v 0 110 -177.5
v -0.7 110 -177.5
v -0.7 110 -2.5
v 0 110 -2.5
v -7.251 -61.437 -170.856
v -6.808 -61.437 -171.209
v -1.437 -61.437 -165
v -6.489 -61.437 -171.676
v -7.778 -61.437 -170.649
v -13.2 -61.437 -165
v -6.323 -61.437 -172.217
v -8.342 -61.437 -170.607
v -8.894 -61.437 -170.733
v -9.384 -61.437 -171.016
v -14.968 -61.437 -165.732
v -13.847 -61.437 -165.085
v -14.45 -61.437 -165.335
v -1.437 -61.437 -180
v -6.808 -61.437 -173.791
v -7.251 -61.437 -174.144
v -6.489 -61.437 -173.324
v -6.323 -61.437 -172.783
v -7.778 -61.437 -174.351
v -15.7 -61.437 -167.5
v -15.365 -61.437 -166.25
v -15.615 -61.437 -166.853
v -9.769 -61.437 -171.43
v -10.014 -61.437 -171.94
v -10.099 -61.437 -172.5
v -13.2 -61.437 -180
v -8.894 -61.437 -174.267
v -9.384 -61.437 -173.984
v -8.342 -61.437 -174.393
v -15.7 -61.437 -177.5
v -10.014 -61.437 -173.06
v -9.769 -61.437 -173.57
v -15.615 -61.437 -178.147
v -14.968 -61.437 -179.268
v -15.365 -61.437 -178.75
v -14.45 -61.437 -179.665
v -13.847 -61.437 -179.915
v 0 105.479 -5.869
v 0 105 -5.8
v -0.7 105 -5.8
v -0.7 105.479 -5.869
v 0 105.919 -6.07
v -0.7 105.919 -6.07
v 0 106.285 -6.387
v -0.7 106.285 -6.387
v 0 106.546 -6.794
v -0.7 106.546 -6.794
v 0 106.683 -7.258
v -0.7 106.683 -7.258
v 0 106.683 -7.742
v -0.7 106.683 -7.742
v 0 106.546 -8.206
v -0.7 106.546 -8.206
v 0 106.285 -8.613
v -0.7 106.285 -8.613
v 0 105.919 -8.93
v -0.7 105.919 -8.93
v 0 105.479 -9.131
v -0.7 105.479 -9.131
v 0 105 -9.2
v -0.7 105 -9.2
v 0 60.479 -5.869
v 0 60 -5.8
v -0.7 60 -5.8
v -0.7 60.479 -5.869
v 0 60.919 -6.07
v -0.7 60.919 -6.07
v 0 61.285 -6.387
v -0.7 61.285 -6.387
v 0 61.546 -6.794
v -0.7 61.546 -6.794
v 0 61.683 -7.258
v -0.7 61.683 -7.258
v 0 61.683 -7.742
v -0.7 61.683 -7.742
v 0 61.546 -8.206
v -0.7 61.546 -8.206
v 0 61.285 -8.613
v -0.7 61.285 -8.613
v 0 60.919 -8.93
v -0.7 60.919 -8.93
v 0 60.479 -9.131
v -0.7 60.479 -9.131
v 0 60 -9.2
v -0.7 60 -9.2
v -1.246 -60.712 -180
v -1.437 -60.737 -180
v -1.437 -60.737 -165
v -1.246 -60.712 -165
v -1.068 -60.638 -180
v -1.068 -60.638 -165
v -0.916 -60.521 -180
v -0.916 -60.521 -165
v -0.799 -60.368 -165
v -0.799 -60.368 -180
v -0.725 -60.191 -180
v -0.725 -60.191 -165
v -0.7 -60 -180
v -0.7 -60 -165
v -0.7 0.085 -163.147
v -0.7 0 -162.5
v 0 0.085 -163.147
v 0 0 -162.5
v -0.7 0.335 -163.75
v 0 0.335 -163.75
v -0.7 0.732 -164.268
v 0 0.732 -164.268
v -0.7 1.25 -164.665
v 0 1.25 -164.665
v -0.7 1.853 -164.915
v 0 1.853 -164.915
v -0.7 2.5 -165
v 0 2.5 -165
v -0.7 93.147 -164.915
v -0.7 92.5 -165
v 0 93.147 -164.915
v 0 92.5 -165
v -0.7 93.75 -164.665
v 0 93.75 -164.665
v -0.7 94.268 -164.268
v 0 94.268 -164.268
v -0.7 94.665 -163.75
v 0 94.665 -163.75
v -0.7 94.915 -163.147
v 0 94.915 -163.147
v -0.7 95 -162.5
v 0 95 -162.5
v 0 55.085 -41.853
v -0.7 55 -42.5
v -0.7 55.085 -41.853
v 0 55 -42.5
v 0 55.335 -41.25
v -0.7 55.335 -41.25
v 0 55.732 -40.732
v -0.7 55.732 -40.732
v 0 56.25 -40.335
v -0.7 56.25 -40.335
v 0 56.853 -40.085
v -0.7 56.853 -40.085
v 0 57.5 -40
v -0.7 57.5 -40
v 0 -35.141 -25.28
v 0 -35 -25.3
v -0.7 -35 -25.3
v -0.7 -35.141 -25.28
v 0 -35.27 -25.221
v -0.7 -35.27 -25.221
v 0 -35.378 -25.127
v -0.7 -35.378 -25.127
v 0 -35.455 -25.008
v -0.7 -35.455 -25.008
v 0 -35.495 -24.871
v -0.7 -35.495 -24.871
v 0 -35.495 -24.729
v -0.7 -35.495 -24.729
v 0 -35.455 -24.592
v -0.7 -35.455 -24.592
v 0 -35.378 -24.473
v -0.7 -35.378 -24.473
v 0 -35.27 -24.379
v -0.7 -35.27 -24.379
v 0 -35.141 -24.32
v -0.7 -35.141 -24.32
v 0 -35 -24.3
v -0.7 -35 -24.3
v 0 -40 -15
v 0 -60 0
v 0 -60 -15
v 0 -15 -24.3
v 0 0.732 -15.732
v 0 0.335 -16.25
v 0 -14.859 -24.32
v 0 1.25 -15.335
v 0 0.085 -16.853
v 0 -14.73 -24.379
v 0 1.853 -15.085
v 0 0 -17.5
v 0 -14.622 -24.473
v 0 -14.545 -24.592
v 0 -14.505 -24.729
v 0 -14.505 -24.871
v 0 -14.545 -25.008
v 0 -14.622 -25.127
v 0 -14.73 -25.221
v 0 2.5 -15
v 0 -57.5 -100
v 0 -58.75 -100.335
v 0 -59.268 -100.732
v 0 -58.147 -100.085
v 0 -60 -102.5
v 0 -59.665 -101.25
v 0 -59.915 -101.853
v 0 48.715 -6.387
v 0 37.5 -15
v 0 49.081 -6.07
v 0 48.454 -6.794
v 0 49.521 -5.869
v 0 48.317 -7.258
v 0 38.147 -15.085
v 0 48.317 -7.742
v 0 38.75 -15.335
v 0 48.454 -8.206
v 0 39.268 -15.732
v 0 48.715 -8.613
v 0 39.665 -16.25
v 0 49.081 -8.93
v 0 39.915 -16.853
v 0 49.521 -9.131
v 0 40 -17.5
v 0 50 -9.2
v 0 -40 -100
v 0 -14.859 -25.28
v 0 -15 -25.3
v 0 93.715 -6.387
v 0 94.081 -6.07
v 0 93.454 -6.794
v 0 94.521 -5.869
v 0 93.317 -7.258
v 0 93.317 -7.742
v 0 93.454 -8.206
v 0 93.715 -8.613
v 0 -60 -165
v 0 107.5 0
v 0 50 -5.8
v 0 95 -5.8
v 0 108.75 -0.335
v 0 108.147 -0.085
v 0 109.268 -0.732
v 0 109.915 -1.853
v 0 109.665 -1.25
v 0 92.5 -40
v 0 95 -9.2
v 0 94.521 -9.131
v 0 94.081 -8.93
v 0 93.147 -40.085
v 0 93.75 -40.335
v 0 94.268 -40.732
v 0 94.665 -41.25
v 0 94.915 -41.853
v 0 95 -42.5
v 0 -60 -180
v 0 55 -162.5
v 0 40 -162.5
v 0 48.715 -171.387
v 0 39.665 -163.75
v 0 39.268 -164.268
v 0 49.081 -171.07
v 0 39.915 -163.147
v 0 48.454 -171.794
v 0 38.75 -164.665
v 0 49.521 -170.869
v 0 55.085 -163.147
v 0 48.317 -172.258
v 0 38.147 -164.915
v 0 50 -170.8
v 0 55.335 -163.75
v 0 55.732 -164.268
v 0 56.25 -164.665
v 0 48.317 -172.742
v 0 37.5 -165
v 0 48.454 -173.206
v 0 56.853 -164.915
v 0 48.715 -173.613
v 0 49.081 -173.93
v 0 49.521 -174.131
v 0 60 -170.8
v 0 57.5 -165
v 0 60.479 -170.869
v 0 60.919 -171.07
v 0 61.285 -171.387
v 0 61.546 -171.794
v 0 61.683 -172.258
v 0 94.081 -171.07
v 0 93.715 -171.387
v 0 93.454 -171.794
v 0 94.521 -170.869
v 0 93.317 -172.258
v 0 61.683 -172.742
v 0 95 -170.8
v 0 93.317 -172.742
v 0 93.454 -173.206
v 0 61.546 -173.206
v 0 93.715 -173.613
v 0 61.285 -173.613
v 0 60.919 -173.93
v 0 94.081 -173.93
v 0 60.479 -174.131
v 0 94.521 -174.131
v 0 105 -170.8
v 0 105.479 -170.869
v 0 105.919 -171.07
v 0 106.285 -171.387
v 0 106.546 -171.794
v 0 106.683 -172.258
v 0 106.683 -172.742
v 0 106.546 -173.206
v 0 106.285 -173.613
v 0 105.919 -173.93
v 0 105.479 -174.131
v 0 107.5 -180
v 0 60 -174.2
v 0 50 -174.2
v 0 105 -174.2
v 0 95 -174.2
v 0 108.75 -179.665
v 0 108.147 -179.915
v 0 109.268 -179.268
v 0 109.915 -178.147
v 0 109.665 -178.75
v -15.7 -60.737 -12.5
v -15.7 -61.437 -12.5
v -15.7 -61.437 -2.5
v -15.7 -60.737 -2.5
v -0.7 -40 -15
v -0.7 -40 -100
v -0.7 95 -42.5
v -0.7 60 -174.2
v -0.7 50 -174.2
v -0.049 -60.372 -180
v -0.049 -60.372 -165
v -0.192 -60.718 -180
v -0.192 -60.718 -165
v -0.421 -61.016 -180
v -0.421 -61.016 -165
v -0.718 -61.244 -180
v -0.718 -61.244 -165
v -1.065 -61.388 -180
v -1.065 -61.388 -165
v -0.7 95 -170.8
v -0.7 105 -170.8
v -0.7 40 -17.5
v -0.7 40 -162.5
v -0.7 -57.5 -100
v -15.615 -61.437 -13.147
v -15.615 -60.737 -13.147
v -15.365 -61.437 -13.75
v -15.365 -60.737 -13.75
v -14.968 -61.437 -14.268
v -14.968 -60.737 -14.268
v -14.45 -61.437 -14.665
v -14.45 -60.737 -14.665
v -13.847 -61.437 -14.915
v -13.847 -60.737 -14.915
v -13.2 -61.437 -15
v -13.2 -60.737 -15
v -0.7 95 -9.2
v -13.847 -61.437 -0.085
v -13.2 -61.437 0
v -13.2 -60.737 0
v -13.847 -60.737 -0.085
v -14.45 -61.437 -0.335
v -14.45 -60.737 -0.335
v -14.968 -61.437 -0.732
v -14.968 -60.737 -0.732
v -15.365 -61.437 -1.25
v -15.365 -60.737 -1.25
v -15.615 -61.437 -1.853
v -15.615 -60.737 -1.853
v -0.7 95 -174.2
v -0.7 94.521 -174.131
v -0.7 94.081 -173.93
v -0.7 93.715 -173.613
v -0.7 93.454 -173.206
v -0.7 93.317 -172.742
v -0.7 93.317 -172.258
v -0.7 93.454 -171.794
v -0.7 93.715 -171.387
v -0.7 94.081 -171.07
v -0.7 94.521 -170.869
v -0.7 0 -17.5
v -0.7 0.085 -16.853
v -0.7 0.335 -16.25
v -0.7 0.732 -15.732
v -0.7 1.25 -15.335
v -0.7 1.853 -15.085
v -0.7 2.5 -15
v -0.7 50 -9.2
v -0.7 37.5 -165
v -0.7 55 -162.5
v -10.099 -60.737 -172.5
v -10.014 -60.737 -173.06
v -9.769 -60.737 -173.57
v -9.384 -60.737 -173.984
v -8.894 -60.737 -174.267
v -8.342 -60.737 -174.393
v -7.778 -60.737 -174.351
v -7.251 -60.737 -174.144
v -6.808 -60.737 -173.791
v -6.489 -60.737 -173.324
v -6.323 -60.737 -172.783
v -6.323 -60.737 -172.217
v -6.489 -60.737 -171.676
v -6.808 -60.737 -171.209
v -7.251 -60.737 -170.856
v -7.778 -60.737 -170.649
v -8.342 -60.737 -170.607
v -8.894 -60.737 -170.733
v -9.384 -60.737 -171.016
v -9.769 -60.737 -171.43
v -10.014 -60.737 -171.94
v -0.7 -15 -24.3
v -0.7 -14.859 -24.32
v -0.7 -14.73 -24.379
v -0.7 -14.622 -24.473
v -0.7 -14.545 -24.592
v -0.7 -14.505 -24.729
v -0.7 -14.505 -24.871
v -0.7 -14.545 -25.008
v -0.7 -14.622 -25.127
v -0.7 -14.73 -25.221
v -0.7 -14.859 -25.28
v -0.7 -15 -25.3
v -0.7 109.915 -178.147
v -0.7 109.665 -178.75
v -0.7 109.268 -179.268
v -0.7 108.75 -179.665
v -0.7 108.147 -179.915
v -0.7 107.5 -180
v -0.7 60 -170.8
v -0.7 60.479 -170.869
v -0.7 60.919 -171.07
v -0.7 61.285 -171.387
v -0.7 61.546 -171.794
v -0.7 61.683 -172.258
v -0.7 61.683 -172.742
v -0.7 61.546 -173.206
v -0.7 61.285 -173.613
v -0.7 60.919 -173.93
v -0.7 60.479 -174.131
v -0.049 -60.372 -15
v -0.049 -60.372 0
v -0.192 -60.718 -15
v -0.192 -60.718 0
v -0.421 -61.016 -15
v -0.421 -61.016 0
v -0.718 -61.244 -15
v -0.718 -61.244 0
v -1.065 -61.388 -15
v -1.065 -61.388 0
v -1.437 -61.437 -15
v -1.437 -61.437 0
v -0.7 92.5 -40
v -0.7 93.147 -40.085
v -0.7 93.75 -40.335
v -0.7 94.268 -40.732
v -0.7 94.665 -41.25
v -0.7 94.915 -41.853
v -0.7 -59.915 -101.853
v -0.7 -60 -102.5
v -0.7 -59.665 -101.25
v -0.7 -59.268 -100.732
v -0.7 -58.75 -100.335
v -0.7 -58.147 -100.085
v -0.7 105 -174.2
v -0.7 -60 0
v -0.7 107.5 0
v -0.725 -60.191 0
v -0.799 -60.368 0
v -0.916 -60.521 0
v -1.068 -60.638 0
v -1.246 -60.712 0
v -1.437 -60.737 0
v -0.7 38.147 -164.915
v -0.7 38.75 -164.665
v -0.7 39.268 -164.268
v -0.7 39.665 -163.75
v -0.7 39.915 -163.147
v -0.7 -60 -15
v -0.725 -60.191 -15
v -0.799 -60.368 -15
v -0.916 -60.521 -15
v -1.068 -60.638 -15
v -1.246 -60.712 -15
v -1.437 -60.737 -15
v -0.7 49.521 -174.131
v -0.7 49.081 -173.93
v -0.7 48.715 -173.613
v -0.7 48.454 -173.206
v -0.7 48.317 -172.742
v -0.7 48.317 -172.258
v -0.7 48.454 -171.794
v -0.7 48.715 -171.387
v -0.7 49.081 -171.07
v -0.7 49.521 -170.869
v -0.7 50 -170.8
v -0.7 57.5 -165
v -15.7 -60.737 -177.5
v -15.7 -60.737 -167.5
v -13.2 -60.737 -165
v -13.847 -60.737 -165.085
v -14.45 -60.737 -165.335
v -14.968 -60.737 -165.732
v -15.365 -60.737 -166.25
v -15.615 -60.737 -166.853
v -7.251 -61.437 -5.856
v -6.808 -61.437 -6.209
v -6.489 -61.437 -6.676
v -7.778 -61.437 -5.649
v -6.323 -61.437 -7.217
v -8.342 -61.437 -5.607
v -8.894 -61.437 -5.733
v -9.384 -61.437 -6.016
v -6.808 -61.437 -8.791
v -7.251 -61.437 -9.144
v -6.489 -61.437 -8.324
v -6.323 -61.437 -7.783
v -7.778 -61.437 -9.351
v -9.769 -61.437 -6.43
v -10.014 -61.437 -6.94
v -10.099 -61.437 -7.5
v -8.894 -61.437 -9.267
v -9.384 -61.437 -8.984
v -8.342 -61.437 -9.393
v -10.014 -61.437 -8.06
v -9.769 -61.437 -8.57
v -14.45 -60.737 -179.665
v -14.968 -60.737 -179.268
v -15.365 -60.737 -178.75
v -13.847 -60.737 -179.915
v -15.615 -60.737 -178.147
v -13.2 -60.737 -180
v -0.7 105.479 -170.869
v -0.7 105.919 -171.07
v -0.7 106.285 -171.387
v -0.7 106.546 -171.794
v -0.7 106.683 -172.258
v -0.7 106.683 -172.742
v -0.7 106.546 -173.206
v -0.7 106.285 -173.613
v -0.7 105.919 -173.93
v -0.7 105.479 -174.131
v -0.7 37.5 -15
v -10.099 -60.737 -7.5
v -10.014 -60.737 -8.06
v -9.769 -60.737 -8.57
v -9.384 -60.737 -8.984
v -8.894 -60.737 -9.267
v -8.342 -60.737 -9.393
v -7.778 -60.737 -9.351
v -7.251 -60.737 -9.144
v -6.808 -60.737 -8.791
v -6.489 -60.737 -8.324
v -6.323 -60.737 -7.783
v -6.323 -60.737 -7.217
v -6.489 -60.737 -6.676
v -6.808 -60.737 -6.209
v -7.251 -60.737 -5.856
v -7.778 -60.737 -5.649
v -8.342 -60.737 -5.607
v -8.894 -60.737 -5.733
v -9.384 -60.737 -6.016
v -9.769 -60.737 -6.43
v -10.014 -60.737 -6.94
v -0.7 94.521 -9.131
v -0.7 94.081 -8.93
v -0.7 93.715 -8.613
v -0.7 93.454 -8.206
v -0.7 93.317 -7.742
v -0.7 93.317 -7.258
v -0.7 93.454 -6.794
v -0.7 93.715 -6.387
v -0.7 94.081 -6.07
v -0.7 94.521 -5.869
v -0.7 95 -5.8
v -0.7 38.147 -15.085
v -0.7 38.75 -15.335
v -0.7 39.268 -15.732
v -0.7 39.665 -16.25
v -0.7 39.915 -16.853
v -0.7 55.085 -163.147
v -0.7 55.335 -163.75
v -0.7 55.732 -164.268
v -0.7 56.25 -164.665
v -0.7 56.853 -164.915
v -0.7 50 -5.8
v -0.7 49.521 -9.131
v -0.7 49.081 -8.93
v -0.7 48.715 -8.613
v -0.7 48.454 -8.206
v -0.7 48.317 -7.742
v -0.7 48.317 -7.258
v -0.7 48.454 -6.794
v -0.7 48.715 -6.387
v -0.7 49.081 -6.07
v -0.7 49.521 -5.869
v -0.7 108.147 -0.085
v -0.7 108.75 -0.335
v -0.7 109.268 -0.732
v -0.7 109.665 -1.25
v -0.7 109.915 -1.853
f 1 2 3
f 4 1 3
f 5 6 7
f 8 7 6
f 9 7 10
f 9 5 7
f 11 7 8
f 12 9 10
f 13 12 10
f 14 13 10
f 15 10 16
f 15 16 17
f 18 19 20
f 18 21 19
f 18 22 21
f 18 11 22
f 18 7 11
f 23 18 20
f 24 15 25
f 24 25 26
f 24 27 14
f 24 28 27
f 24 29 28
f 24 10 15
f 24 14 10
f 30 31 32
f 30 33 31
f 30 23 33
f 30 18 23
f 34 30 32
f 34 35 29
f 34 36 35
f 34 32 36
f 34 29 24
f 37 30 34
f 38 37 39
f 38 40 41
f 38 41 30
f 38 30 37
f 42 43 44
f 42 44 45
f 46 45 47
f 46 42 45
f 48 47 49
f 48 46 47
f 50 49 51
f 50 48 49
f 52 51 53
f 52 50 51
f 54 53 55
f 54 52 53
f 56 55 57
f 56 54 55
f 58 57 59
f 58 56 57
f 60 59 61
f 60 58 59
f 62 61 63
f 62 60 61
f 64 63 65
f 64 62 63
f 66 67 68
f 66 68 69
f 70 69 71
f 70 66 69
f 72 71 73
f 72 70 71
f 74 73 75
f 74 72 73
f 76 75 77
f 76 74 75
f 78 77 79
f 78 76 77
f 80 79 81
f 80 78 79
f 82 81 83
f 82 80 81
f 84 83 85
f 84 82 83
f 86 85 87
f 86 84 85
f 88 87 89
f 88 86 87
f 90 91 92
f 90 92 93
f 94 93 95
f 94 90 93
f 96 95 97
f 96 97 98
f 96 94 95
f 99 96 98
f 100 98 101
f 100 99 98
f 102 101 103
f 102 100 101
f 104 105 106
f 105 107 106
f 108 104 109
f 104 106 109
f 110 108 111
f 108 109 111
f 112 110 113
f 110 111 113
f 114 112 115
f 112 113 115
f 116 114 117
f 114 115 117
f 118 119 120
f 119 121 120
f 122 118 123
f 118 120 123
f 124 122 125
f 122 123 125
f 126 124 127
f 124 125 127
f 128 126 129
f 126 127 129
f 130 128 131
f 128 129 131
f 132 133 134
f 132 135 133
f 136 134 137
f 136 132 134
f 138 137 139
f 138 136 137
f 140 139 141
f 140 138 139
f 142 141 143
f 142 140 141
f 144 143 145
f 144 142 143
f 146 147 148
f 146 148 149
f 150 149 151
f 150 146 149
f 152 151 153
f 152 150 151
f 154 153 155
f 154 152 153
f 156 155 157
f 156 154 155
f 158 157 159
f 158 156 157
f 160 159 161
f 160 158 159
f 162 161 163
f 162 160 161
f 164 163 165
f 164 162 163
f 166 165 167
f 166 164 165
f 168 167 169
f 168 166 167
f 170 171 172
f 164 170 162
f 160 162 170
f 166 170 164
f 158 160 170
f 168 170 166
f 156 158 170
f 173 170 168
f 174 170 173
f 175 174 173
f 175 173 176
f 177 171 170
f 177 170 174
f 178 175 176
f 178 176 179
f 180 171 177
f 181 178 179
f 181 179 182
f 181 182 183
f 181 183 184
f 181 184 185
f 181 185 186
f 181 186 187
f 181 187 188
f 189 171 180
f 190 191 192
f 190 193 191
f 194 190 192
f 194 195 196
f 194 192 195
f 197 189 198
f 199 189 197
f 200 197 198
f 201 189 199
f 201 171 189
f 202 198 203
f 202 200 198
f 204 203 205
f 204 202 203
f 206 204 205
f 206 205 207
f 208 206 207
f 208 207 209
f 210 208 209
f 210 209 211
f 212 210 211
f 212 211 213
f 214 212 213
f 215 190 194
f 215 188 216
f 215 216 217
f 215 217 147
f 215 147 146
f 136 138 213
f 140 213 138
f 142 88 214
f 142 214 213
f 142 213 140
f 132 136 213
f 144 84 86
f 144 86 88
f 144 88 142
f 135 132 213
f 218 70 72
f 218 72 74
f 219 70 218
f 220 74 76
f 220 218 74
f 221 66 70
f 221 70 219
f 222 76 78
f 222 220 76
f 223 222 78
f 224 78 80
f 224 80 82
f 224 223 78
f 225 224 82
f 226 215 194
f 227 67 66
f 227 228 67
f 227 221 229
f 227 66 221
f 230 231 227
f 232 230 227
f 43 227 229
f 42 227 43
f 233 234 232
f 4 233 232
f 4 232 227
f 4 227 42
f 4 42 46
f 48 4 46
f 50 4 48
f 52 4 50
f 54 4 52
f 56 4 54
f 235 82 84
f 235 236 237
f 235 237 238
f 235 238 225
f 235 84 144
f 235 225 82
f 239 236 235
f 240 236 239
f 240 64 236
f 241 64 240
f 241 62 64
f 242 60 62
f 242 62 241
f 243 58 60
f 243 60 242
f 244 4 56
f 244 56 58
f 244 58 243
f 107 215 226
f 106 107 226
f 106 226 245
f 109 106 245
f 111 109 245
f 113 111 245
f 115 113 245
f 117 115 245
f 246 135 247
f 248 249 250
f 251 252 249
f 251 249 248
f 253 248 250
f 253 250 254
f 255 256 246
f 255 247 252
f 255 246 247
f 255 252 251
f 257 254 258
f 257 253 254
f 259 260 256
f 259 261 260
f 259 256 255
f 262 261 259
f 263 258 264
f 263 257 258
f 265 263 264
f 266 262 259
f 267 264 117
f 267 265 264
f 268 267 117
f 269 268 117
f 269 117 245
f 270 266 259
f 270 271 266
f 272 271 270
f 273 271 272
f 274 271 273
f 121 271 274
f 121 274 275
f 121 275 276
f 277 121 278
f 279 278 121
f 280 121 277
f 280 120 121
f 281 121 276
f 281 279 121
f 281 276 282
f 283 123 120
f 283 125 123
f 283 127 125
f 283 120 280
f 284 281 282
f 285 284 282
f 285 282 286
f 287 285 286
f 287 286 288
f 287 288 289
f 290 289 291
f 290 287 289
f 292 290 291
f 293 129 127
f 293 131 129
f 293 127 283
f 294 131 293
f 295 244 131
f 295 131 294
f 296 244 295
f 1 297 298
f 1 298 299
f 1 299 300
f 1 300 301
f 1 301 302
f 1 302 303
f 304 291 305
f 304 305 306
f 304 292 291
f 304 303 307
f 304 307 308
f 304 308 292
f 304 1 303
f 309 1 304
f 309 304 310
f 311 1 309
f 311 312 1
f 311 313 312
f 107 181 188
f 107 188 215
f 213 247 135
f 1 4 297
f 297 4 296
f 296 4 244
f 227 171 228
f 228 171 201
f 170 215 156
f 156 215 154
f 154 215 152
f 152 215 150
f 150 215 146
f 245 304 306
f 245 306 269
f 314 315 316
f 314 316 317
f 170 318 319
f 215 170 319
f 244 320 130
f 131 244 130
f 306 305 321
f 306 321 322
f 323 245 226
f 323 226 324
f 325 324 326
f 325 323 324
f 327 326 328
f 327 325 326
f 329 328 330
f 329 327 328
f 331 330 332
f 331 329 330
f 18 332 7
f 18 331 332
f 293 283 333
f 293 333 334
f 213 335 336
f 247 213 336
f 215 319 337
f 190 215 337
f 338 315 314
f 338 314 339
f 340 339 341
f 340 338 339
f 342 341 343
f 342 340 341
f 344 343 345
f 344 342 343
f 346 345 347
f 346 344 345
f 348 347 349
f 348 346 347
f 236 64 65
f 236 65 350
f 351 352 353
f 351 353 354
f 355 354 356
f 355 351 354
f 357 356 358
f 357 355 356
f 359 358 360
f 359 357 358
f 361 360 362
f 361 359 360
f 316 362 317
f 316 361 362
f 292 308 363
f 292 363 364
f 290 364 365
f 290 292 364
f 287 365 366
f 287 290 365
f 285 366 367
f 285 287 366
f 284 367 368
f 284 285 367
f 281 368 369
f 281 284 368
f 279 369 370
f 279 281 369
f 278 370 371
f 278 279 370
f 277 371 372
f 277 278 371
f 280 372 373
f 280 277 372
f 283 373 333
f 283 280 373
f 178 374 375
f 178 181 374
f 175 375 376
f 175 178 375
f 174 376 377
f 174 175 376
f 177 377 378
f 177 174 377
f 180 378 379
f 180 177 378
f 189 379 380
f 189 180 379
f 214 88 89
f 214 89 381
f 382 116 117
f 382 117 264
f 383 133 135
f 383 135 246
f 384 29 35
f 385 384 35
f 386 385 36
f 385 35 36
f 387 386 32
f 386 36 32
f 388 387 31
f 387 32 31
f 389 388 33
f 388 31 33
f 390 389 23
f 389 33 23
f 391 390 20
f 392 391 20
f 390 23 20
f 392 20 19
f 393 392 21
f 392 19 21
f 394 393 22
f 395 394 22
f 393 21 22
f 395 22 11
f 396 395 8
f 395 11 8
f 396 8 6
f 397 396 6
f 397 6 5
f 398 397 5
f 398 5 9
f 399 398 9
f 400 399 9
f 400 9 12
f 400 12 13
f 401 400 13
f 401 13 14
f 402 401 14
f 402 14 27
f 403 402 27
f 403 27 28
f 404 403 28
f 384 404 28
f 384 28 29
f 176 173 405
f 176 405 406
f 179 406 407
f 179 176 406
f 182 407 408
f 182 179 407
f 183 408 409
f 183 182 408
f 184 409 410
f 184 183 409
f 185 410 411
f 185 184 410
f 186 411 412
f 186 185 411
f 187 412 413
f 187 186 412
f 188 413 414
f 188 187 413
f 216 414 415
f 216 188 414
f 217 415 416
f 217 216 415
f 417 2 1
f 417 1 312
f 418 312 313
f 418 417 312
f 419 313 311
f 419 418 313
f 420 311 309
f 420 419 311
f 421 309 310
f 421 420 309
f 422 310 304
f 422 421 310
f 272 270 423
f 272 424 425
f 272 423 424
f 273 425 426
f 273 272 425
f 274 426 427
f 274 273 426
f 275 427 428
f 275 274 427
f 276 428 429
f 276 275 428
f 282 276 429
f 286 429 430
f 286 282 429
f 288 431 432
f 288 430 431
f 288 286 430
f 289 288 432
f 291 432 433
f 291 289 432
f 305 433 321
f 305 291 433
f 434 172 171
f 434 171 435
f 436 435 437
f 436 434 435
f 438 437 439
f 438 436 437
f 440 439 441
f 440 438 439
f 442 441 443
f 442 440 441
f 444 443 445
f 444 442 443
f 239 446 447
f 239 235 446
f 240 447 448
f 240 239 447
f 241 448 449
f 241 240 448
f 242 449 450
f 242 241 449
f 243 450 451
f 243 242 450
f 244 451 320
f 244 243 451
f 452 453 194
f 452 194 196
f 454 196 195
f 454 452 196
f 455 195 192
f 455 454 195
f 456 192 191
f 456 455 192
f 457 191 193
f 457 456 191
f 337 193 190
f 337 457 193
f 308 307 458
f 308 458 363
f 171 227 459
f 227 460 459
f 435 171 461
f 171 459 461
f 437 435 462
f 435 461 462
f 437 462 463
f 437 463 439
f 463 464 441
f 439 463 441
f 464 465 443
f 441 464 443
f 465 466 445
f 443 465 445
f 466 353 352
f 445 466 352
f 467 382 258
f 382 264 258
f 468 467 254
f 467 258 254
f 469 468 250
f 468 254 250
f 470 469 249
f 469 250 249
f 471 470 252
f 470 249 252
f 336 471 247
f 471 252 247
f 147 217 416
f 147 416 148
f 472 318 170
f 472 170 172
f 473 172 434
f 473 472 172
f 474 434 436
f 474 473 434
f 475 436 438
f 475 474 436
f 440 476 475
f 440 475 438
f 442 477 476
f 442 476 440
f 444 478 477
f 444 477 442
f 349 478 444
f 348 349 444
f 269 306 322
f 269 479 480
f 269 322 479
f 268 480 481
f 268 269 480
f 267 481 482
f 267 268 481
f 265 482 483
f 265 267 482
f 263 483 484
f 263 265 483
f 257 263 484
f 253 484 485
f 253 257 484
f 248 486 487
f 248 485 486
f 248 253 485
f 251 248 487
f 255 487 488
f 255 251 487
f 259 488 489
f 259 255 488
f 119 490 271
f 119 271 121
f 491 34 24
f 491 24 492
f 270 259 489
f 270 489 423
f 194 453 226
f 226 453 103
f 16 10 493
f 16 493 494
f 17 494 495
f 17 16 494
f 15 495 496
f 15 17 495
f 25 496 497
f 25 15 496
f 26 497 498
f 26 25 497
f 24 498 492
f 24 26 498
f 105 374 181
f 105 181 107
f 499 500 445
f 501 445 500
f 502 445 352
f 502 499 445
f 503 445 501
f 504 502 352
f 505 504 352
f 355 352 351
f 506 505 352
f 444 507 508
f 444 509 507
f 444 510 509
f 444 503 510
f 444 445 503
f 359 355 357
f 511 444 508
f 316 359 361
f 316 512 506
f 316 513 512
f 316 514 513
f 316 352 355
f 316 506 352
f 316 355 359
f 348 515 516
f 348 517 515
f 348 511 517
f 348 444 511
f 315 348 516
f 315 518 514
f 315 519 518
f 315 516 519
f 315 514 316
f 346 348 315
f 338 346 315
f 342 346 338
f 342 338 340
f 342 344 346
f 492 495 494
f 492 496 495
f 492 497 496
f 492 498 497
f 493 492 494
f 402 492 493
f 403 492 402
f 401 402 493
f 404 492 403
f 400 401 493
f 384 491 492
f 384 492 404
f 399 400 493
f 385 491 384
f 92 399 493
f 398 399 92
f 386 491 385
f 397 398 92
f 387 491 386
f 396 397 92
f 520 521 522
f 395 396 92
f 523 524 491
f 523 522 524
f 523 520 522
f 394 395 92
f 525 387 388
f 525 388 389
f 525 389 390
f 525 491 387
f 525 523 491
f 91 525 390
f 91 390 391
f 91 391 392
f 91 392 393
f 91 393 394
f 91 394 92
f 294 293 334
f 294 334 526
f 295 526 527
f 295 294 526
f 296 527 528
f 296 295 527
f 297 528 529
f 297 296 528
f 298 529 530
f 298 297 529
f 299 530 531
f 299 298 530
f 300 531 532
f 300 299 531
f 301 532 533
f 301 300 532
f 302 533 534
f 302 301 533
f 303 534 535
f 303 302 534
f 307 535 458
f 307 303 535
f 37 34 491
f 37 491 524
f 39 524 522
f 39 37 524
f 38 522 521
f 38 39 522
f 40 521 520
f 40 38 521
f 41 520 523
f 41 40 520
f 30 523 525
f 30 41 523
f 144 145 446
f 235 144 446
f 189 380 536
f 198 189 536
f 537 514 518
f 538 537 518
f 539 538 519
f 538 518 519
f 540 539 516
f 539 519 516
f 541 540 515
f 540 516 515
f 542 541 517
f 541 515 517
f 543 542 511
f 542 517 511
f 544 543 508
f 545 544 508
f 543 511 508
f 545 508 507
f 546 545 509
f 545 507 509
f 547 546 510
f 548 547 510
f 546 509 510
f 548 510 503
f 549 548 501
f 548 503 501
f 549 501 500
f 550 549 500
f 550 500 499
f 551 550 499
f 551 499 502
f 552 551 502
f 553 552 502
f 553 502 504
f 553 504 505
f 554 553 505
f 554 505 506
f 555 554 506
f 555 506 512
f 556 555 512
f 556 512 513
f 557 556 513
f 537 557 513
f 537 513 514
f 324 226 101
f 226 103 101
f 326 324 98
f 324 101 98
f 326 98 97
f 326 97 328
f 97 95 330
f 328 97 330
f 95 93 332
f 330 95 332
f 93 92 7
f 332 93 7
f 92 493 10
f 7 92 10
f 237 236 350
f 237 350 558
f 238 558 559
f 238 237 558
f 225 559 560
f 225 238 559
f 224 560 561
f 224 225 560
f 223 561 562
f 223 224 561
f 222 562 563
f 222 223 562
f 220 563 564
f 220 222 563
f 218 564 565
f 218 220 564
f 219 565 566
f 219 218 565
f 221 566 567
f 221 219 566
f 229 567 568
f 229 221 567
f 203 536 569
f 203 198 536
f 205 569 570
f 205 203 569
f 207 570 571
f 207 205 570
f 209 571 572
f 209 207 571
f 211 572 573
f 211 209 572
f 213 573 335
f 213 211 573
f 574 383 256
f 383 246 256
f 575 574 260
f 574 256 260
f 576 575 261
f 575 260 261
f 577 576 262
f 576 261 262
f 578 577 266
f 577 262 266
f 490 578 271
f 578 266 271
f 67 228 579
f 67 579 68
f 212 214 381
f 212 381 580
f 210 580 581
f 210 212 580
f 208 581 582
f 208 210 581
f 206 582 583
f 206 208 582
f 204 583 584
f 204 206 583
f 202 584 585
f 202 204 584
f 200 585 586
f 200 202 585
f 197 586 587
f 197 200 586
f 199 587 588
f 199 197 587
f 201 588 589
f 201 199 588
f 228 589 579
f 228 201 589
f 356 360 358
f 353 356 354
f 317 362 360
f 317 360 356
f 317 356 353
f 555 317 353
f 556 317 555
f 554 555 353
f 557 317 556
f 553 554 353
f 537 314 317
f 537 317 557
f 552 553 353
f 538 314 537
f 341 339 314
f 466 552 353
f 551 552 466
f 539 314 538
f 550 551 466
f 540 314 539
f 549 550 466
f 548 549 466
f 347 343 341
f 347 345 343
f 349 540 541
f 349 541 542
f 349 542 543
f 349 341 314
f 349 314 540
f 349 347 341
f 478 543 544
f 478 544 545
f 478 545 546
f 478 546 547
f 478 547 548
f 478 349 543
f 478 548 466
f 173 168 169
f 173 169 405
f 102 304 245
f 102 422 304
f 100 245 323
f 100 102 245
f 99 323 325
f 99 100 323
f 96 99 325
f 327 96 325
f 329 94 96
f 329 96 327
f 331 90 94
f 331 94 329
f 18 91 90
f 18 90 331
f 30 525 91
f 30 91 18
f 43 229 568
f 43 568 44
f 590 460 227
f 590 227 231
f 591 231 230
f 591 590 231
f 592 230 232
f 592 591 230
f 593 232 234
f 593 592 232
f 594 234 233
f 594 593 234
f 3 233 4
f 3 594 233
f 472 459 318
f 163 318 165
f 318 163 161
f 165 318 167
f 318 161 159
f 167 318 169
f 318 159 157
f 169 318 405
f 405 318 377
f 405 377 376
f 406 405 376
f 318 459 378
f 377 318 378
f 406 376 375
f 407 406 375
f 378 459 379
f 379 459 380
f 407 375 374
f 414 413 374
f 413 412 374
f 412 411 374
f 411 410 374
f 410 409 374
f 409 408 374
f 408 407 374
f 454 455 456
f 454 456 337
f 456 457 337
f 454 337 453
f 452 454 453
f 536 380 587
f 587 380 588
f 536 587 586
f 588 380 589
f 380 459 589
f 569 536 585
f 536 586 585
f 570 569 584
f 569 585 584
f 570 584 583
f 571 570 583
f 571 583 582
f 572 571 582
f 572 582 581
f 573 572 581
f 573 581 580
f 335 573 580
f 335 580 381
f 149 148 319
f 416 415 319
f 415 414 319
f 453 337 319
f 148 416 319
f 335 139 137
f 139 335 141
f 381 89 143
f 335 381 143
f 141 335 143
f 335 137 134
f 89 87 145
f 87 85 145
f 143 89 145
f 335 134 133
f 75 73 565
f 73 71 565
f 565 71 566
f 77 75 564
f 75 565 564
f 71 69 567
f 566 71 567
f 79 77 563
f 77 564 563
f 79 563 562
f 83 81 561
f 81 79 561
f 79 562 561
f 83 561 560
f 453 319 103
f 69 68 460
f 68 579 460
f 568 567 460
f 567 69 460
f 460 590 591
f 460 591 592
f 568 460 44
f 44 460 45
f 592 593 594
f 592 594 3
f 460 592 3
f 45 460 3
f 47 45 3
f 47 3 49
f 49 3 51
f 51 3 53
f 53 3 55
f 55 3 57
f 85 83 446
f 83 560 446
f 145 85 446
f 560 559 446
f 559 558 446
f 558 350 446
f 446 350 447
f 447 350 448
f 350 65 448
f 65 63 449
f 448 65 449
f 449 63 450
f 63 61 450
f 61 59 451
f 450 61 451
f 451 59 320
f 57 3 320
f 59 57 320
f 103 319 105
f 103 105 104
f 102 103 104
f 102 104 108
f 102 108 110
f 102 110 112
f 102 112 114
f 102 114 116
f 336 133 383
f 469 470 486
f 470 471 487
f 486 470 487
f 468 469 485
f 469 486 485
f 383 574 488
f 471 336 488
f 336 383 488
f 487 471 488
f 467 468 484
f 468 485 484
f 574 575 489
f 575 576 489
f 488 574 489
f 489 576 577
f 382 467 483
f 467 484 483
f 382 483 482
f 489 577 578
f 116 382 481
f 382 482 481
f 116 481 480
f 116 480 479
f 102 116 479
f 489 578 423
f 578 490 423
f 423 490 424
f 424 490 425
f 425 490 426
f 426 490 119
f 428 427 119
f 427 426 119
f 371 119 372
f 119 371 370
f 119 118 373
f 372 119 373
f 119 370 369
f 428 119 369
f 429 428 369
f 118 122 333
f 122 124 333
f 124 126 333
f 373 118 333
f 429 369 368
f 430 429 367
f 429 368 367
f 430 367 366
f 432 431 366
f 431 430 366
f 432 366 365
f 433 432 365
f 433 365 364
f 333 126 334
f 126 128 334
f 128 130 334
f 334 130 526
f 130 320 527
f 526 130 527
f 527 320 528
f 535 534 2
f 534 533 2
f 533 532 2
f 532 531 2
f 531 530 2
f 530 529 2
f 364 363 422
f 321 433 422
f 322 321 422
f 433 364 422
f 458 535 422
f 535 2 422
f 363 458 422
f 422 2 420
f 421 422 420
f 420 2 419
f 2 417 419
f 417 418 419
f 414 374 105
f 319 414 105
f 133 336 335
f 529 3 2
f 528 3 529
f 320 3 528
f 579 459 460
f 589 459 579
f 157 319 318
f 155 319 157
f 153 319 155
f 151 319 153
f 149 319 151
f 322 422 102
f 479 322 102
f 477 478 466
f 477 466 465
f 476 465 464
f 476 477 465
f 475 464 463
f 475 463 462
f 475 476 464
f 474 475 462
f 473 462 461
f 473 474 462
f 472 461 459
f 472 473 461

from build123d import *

# Parameters (mm, degrees)
BASE_FLANGE1_START        = -0.7
BASE_FLANGE1_OUTLINE_W    = 150
BASE_FLANGE1_OUTLINE_H    = 40
BASE_FLANGE1_OUTLINE_W_2  = 125
BASE_FLANGE1_DEPTH        = 0.7
CUT_EXTRUDE1_DEPTH        = 10
EDGE_FLANGE3_DEPTH        = 15
EDGE_FLANGE2_DEPTH        = 15
F_6_CLEARANCE_HOLE1_D     = 3.7973
F_6_CLEARANCE_HOLE1_DEPTH = 10
F_6_CLEARANCE_HOLE1_TIP   = 1.140824014
CUT_EXTRUDE2_DEPTH        = 10
BREAK_CORNER1_START       = -61.4366
BREAK_CORNER1_DEPTH       = 0.7
BREAK_CORNER1_START_2     = -0.7
BREAK_CORNER1_2_DEPTH     = 0.7
FILLET1_R                 = 2.5


# Read off the part's stored shape, not the designer's step: Base-Flange1, Break-Corner1
# Sheet-metal steps are written as plain solids
with BuildPart() as part:
    # Base-Flange1 outline → Base-Flange1 (new body)
    with BuildSketch(Plane(origin=(0, 0, 0), x_dir=(0, 0, -1), z_dir=(1, 0, 0)).offset(BASE_FLANGE1_START)):
        Polygon((180, 110), (0, 110), (0, -60), (15, -60), (15, -40), (100, -40), (100, -60), (180, -60), align=None)
        with Locations((90, 20)):
            Rectangle(BASE_FLANGE1_OUTLINE_W, BASE_FLANGE1_OUTLINE_H, mode=Mode.SUBTRACT)
        with Locations((102.5, 75)):
            Rectangle(BASE_FLANGE1_OUTLINE_W_2, BASE_FLANGE1_OUTLINE_H, mode=Mode.SUBTRACT)
    extrude(amount=BASE_FLANGE1_DEPTH)

    # Sketch4 → Cut-Extrude1 (cut)
    with BuildSketch(Plane(origin=(0, 0, 0), x_dir=(0, 0, -1), z_dir=(1, 0, 0))):
        with BuildLine():
            Line((25.3, -15), (25.3, -35))
            ThreePointArc((25.3, -35), (24.8, -35.5), (24.3, -35))
            Line((24.3, -35), (24.3, -15))
            ThreePointArc((24.3, -15), (24.8, -14.5), (25.3, -15))
        make_face()
    extrude(amount=-CUT_EXTRUDE1_DEPTH, mode=Mode.SUBTRACT)

    # Edge-Flange3 section (across the edge) → Edge-Flange3 (add)
    with BuildSketch(Plane(origin=(-0.7, -60.7366, -180), x_dir=(0, 1, 0), z_dir=(0, 0, 1))):
        with BuildLine():
            Line((-0.7, 0.7366), (-0.7, 15))
            Line((-0.7, 15), (0, 15))
            Line((0, 15), (0, 0.7366))
            ThreePointArc((0, 0.7366), (0.215745145, 0.215745145), (0.7366, 0))
            Line((0.7366, 0), (0.7366, -0.7))
            ThreePointArc((0.7366, -0.7), (-0.279229602, -0.279229602), (-0.7, 0.7366))
        make_face()
    extrude(amount=EDGE_FLANGE3_DEPTH)

    # Edge-Flange2 section (across the edge) → Edge-Flange2 (add)
    with BuildSketch(Plane(origin=(-0.7, -60.7366, -15), x_dir=(0, 1, 0), z_dir=(0, 0, 1))):
        with BuildLine():
            Line((-0.7, 0.7366), (-0.7, 15))
            Line((-0.7, 15), (0, 15))
            Line((0, 15), (0, 0.7366))
            ThreePointArc((0, 0.7366), (0.215745145, 0.215745145), (0.7366, 0))
            Line((0.7366, 0), (0.7366, -0.7))
            ThreePointArc((0.7366, -0.7), (-0.279229602, -0.279229602), (-0.7, 0.7366))
        make_face()
    extrude(amount=EDGE_FLANGE2_DEPTH)

    # #6 Clearance Hole1
    with Locations(Plane(origin=(0, -60.7366, 0), x_dir=(1, 0, 0), z_dir=(0, 1, 0))):
        with Locations((-8.2, 7.5), (-8.2, 172.5)):
            Hole(F_6_CLEARANCE_HOLE1_D / 2, depth=F_6_CLEARANCE_HOLE1_DEPTH)
            with Locations((0, 0, -(F_6_CLEARANCE_HOLE1_DEPTH + F_6_CLEARANCE_HOLE1_TIP / 2))):  # 118° drill point
                Cone(0, F_6_CLEARANCE_HOLE1_D / 2, F_6_CLEARANCE_HOLE1_TIP, mode=Mode.SUBTRACT)

    # Sketch13 → Cut-Extrude2 (cut)
    with BuildSketch(Plane(origin=(0, 0, 0), x_dir=(0, 0, -1), z_dir=(1, 0, 0))):
        with BuildLine():
            Line((9.2, 105), (9.2, 95))
            ThreePointArc((9.2, 95), (7.5, 93.3), (5.8, 95))
            Line((5.8, 95), (5.8, 105))
            ThreePointArc((5.8, 105), (7.5, 106.7), (9.2, 105))
        make_face()
        with BuildLine():
            Line((174.2, 105), (174.2, 95))
            ThreePointArc((174.2, 95), (172.5, 93.3), (170.8, 95))
            Line((170.8, 95), (170.8, 105))
            ThreePointArc((170.8, 105), (172.5, 106.7), (174.2, 105))
        make_face()
        with BuildLine():
            Line((9.2, 60), (9.2, 50))
            ThreePointArc((9.2, 50), (7.5, 48.3), (5.8, 50))
            Line((5.8, 50), (5.8, 60))
            ThreePointArc((5.8, 60), (7.5, 61.7), (9.2, 60))
        make_face()
        with BuildLine():
            Line((174.2, 60), (174.2, 50))
            ThreePointArc((174.2, 50), (172.5, 48.3), (170.8, 50))
            Line((170.8, 50), (170.8, 60))
            ThreePointArc((170.8, 60), (172.5, 61.7), (174.2, 60))
        make_face()
    extrude(amount=-CUT_EXTRUDE2_DEPTH, mode=Mode.SUBTRACT)

    # Break-Corner1 outline → Break-Corner1 (cut)
    with BuildSketch(Plane(origin=(0, 0, 0), x_dir=(1, 0, 0), z_dir=(0, 1, 0)).offset(BREAK_CORNER1_START)):
        with BuildLine():
            ThreePointArc((-13.2, 0), (-14.967766953, 0.732233047), (-15.7, 2.5))
            Line((-15.7, 2.5), (-15.7, 0))
            Line((-15.7, 0), (-13.2, 0))
        make_face()
        with BuildLine():
            ThreePointArc((-15.7, 12.5), (-14.967766953, 14.267766953), (-13.2, 15))
            Line((-13.2, 15), (-15.7, 15))
            Line((-15.7, 15), (-15.7, 12.5))
        make_face()
        with BuildLine():
            Line((-15.7, 180), (-15.7, 177.5))
            ThreePointArc((-15.7, 177.5), (-14.967766953, 179.267766953), (-13.2, 180))
            Line((-13.2, 180), (-15.7, 180))
        make_face()
        with BuildLine():
            ThreePointArc((-13.2, 165), (-14.967766953, 165.732233047), (-15.7, 167.5))
            Line((-15.7, 167.5), (-15.7, 165))
            Line((-15.7, 165), (-13.2, 165))
        make_face()
    extrude(amount=BREAK_CORNER1_DEPTH, mode=Mode.SUBTRACT)

    # Break-Corner1 2 outline → Break-Corner1 2 (cut)
    with BuildSketch(Plane.YZ.offset(BREAK_CORNER1_START_2)):
        with BuildLine():
            ThreePointArc((107.5, 0), (109.267766953, -0.732233047), (110, -2.5))
            Line((110, -2.5), (110, 0))
            Line((110, 0), (107.5, 0))
        make_face()
        with BuildLine():
            ThreePointArc((110, -177.5), (109.267766953, -179.267766953), (107.5, -180))
            Line((107.5, -180), (110, -180))
            Line((110, -180), (110, -177.5))
        make_face()
        with BuildLine():
            ThreePointArc((-60, -102.5), (-59.267766953, -100.732233047), (-57.5, -100))
            Line((-57.5, -100), (-60, -100))
            Line((-60, -100), (-60, -102.5))
        make_face()
    extrude(amount=BREAK_CORNER1_2_DEPTH, mode=Mode.SUBTRACT)

    # Fillet1
    fillet1_edges = [part.edges().sort_by_distance(p)[0] for p in [
        (-0.35, 55, -40),
        (-0.35, 95, -40),
        (-0.35, 95, -165),
        (-0.35, 55, -165),
        (-0.35, 40, -165),
        (-0.35, 0, -165),
        (-0.35, 0, -15),
        (-0.35, 40, -15),
    ]]
    fillet(fillet1_edges, radius=FILLET1_R)


solid = part.part
